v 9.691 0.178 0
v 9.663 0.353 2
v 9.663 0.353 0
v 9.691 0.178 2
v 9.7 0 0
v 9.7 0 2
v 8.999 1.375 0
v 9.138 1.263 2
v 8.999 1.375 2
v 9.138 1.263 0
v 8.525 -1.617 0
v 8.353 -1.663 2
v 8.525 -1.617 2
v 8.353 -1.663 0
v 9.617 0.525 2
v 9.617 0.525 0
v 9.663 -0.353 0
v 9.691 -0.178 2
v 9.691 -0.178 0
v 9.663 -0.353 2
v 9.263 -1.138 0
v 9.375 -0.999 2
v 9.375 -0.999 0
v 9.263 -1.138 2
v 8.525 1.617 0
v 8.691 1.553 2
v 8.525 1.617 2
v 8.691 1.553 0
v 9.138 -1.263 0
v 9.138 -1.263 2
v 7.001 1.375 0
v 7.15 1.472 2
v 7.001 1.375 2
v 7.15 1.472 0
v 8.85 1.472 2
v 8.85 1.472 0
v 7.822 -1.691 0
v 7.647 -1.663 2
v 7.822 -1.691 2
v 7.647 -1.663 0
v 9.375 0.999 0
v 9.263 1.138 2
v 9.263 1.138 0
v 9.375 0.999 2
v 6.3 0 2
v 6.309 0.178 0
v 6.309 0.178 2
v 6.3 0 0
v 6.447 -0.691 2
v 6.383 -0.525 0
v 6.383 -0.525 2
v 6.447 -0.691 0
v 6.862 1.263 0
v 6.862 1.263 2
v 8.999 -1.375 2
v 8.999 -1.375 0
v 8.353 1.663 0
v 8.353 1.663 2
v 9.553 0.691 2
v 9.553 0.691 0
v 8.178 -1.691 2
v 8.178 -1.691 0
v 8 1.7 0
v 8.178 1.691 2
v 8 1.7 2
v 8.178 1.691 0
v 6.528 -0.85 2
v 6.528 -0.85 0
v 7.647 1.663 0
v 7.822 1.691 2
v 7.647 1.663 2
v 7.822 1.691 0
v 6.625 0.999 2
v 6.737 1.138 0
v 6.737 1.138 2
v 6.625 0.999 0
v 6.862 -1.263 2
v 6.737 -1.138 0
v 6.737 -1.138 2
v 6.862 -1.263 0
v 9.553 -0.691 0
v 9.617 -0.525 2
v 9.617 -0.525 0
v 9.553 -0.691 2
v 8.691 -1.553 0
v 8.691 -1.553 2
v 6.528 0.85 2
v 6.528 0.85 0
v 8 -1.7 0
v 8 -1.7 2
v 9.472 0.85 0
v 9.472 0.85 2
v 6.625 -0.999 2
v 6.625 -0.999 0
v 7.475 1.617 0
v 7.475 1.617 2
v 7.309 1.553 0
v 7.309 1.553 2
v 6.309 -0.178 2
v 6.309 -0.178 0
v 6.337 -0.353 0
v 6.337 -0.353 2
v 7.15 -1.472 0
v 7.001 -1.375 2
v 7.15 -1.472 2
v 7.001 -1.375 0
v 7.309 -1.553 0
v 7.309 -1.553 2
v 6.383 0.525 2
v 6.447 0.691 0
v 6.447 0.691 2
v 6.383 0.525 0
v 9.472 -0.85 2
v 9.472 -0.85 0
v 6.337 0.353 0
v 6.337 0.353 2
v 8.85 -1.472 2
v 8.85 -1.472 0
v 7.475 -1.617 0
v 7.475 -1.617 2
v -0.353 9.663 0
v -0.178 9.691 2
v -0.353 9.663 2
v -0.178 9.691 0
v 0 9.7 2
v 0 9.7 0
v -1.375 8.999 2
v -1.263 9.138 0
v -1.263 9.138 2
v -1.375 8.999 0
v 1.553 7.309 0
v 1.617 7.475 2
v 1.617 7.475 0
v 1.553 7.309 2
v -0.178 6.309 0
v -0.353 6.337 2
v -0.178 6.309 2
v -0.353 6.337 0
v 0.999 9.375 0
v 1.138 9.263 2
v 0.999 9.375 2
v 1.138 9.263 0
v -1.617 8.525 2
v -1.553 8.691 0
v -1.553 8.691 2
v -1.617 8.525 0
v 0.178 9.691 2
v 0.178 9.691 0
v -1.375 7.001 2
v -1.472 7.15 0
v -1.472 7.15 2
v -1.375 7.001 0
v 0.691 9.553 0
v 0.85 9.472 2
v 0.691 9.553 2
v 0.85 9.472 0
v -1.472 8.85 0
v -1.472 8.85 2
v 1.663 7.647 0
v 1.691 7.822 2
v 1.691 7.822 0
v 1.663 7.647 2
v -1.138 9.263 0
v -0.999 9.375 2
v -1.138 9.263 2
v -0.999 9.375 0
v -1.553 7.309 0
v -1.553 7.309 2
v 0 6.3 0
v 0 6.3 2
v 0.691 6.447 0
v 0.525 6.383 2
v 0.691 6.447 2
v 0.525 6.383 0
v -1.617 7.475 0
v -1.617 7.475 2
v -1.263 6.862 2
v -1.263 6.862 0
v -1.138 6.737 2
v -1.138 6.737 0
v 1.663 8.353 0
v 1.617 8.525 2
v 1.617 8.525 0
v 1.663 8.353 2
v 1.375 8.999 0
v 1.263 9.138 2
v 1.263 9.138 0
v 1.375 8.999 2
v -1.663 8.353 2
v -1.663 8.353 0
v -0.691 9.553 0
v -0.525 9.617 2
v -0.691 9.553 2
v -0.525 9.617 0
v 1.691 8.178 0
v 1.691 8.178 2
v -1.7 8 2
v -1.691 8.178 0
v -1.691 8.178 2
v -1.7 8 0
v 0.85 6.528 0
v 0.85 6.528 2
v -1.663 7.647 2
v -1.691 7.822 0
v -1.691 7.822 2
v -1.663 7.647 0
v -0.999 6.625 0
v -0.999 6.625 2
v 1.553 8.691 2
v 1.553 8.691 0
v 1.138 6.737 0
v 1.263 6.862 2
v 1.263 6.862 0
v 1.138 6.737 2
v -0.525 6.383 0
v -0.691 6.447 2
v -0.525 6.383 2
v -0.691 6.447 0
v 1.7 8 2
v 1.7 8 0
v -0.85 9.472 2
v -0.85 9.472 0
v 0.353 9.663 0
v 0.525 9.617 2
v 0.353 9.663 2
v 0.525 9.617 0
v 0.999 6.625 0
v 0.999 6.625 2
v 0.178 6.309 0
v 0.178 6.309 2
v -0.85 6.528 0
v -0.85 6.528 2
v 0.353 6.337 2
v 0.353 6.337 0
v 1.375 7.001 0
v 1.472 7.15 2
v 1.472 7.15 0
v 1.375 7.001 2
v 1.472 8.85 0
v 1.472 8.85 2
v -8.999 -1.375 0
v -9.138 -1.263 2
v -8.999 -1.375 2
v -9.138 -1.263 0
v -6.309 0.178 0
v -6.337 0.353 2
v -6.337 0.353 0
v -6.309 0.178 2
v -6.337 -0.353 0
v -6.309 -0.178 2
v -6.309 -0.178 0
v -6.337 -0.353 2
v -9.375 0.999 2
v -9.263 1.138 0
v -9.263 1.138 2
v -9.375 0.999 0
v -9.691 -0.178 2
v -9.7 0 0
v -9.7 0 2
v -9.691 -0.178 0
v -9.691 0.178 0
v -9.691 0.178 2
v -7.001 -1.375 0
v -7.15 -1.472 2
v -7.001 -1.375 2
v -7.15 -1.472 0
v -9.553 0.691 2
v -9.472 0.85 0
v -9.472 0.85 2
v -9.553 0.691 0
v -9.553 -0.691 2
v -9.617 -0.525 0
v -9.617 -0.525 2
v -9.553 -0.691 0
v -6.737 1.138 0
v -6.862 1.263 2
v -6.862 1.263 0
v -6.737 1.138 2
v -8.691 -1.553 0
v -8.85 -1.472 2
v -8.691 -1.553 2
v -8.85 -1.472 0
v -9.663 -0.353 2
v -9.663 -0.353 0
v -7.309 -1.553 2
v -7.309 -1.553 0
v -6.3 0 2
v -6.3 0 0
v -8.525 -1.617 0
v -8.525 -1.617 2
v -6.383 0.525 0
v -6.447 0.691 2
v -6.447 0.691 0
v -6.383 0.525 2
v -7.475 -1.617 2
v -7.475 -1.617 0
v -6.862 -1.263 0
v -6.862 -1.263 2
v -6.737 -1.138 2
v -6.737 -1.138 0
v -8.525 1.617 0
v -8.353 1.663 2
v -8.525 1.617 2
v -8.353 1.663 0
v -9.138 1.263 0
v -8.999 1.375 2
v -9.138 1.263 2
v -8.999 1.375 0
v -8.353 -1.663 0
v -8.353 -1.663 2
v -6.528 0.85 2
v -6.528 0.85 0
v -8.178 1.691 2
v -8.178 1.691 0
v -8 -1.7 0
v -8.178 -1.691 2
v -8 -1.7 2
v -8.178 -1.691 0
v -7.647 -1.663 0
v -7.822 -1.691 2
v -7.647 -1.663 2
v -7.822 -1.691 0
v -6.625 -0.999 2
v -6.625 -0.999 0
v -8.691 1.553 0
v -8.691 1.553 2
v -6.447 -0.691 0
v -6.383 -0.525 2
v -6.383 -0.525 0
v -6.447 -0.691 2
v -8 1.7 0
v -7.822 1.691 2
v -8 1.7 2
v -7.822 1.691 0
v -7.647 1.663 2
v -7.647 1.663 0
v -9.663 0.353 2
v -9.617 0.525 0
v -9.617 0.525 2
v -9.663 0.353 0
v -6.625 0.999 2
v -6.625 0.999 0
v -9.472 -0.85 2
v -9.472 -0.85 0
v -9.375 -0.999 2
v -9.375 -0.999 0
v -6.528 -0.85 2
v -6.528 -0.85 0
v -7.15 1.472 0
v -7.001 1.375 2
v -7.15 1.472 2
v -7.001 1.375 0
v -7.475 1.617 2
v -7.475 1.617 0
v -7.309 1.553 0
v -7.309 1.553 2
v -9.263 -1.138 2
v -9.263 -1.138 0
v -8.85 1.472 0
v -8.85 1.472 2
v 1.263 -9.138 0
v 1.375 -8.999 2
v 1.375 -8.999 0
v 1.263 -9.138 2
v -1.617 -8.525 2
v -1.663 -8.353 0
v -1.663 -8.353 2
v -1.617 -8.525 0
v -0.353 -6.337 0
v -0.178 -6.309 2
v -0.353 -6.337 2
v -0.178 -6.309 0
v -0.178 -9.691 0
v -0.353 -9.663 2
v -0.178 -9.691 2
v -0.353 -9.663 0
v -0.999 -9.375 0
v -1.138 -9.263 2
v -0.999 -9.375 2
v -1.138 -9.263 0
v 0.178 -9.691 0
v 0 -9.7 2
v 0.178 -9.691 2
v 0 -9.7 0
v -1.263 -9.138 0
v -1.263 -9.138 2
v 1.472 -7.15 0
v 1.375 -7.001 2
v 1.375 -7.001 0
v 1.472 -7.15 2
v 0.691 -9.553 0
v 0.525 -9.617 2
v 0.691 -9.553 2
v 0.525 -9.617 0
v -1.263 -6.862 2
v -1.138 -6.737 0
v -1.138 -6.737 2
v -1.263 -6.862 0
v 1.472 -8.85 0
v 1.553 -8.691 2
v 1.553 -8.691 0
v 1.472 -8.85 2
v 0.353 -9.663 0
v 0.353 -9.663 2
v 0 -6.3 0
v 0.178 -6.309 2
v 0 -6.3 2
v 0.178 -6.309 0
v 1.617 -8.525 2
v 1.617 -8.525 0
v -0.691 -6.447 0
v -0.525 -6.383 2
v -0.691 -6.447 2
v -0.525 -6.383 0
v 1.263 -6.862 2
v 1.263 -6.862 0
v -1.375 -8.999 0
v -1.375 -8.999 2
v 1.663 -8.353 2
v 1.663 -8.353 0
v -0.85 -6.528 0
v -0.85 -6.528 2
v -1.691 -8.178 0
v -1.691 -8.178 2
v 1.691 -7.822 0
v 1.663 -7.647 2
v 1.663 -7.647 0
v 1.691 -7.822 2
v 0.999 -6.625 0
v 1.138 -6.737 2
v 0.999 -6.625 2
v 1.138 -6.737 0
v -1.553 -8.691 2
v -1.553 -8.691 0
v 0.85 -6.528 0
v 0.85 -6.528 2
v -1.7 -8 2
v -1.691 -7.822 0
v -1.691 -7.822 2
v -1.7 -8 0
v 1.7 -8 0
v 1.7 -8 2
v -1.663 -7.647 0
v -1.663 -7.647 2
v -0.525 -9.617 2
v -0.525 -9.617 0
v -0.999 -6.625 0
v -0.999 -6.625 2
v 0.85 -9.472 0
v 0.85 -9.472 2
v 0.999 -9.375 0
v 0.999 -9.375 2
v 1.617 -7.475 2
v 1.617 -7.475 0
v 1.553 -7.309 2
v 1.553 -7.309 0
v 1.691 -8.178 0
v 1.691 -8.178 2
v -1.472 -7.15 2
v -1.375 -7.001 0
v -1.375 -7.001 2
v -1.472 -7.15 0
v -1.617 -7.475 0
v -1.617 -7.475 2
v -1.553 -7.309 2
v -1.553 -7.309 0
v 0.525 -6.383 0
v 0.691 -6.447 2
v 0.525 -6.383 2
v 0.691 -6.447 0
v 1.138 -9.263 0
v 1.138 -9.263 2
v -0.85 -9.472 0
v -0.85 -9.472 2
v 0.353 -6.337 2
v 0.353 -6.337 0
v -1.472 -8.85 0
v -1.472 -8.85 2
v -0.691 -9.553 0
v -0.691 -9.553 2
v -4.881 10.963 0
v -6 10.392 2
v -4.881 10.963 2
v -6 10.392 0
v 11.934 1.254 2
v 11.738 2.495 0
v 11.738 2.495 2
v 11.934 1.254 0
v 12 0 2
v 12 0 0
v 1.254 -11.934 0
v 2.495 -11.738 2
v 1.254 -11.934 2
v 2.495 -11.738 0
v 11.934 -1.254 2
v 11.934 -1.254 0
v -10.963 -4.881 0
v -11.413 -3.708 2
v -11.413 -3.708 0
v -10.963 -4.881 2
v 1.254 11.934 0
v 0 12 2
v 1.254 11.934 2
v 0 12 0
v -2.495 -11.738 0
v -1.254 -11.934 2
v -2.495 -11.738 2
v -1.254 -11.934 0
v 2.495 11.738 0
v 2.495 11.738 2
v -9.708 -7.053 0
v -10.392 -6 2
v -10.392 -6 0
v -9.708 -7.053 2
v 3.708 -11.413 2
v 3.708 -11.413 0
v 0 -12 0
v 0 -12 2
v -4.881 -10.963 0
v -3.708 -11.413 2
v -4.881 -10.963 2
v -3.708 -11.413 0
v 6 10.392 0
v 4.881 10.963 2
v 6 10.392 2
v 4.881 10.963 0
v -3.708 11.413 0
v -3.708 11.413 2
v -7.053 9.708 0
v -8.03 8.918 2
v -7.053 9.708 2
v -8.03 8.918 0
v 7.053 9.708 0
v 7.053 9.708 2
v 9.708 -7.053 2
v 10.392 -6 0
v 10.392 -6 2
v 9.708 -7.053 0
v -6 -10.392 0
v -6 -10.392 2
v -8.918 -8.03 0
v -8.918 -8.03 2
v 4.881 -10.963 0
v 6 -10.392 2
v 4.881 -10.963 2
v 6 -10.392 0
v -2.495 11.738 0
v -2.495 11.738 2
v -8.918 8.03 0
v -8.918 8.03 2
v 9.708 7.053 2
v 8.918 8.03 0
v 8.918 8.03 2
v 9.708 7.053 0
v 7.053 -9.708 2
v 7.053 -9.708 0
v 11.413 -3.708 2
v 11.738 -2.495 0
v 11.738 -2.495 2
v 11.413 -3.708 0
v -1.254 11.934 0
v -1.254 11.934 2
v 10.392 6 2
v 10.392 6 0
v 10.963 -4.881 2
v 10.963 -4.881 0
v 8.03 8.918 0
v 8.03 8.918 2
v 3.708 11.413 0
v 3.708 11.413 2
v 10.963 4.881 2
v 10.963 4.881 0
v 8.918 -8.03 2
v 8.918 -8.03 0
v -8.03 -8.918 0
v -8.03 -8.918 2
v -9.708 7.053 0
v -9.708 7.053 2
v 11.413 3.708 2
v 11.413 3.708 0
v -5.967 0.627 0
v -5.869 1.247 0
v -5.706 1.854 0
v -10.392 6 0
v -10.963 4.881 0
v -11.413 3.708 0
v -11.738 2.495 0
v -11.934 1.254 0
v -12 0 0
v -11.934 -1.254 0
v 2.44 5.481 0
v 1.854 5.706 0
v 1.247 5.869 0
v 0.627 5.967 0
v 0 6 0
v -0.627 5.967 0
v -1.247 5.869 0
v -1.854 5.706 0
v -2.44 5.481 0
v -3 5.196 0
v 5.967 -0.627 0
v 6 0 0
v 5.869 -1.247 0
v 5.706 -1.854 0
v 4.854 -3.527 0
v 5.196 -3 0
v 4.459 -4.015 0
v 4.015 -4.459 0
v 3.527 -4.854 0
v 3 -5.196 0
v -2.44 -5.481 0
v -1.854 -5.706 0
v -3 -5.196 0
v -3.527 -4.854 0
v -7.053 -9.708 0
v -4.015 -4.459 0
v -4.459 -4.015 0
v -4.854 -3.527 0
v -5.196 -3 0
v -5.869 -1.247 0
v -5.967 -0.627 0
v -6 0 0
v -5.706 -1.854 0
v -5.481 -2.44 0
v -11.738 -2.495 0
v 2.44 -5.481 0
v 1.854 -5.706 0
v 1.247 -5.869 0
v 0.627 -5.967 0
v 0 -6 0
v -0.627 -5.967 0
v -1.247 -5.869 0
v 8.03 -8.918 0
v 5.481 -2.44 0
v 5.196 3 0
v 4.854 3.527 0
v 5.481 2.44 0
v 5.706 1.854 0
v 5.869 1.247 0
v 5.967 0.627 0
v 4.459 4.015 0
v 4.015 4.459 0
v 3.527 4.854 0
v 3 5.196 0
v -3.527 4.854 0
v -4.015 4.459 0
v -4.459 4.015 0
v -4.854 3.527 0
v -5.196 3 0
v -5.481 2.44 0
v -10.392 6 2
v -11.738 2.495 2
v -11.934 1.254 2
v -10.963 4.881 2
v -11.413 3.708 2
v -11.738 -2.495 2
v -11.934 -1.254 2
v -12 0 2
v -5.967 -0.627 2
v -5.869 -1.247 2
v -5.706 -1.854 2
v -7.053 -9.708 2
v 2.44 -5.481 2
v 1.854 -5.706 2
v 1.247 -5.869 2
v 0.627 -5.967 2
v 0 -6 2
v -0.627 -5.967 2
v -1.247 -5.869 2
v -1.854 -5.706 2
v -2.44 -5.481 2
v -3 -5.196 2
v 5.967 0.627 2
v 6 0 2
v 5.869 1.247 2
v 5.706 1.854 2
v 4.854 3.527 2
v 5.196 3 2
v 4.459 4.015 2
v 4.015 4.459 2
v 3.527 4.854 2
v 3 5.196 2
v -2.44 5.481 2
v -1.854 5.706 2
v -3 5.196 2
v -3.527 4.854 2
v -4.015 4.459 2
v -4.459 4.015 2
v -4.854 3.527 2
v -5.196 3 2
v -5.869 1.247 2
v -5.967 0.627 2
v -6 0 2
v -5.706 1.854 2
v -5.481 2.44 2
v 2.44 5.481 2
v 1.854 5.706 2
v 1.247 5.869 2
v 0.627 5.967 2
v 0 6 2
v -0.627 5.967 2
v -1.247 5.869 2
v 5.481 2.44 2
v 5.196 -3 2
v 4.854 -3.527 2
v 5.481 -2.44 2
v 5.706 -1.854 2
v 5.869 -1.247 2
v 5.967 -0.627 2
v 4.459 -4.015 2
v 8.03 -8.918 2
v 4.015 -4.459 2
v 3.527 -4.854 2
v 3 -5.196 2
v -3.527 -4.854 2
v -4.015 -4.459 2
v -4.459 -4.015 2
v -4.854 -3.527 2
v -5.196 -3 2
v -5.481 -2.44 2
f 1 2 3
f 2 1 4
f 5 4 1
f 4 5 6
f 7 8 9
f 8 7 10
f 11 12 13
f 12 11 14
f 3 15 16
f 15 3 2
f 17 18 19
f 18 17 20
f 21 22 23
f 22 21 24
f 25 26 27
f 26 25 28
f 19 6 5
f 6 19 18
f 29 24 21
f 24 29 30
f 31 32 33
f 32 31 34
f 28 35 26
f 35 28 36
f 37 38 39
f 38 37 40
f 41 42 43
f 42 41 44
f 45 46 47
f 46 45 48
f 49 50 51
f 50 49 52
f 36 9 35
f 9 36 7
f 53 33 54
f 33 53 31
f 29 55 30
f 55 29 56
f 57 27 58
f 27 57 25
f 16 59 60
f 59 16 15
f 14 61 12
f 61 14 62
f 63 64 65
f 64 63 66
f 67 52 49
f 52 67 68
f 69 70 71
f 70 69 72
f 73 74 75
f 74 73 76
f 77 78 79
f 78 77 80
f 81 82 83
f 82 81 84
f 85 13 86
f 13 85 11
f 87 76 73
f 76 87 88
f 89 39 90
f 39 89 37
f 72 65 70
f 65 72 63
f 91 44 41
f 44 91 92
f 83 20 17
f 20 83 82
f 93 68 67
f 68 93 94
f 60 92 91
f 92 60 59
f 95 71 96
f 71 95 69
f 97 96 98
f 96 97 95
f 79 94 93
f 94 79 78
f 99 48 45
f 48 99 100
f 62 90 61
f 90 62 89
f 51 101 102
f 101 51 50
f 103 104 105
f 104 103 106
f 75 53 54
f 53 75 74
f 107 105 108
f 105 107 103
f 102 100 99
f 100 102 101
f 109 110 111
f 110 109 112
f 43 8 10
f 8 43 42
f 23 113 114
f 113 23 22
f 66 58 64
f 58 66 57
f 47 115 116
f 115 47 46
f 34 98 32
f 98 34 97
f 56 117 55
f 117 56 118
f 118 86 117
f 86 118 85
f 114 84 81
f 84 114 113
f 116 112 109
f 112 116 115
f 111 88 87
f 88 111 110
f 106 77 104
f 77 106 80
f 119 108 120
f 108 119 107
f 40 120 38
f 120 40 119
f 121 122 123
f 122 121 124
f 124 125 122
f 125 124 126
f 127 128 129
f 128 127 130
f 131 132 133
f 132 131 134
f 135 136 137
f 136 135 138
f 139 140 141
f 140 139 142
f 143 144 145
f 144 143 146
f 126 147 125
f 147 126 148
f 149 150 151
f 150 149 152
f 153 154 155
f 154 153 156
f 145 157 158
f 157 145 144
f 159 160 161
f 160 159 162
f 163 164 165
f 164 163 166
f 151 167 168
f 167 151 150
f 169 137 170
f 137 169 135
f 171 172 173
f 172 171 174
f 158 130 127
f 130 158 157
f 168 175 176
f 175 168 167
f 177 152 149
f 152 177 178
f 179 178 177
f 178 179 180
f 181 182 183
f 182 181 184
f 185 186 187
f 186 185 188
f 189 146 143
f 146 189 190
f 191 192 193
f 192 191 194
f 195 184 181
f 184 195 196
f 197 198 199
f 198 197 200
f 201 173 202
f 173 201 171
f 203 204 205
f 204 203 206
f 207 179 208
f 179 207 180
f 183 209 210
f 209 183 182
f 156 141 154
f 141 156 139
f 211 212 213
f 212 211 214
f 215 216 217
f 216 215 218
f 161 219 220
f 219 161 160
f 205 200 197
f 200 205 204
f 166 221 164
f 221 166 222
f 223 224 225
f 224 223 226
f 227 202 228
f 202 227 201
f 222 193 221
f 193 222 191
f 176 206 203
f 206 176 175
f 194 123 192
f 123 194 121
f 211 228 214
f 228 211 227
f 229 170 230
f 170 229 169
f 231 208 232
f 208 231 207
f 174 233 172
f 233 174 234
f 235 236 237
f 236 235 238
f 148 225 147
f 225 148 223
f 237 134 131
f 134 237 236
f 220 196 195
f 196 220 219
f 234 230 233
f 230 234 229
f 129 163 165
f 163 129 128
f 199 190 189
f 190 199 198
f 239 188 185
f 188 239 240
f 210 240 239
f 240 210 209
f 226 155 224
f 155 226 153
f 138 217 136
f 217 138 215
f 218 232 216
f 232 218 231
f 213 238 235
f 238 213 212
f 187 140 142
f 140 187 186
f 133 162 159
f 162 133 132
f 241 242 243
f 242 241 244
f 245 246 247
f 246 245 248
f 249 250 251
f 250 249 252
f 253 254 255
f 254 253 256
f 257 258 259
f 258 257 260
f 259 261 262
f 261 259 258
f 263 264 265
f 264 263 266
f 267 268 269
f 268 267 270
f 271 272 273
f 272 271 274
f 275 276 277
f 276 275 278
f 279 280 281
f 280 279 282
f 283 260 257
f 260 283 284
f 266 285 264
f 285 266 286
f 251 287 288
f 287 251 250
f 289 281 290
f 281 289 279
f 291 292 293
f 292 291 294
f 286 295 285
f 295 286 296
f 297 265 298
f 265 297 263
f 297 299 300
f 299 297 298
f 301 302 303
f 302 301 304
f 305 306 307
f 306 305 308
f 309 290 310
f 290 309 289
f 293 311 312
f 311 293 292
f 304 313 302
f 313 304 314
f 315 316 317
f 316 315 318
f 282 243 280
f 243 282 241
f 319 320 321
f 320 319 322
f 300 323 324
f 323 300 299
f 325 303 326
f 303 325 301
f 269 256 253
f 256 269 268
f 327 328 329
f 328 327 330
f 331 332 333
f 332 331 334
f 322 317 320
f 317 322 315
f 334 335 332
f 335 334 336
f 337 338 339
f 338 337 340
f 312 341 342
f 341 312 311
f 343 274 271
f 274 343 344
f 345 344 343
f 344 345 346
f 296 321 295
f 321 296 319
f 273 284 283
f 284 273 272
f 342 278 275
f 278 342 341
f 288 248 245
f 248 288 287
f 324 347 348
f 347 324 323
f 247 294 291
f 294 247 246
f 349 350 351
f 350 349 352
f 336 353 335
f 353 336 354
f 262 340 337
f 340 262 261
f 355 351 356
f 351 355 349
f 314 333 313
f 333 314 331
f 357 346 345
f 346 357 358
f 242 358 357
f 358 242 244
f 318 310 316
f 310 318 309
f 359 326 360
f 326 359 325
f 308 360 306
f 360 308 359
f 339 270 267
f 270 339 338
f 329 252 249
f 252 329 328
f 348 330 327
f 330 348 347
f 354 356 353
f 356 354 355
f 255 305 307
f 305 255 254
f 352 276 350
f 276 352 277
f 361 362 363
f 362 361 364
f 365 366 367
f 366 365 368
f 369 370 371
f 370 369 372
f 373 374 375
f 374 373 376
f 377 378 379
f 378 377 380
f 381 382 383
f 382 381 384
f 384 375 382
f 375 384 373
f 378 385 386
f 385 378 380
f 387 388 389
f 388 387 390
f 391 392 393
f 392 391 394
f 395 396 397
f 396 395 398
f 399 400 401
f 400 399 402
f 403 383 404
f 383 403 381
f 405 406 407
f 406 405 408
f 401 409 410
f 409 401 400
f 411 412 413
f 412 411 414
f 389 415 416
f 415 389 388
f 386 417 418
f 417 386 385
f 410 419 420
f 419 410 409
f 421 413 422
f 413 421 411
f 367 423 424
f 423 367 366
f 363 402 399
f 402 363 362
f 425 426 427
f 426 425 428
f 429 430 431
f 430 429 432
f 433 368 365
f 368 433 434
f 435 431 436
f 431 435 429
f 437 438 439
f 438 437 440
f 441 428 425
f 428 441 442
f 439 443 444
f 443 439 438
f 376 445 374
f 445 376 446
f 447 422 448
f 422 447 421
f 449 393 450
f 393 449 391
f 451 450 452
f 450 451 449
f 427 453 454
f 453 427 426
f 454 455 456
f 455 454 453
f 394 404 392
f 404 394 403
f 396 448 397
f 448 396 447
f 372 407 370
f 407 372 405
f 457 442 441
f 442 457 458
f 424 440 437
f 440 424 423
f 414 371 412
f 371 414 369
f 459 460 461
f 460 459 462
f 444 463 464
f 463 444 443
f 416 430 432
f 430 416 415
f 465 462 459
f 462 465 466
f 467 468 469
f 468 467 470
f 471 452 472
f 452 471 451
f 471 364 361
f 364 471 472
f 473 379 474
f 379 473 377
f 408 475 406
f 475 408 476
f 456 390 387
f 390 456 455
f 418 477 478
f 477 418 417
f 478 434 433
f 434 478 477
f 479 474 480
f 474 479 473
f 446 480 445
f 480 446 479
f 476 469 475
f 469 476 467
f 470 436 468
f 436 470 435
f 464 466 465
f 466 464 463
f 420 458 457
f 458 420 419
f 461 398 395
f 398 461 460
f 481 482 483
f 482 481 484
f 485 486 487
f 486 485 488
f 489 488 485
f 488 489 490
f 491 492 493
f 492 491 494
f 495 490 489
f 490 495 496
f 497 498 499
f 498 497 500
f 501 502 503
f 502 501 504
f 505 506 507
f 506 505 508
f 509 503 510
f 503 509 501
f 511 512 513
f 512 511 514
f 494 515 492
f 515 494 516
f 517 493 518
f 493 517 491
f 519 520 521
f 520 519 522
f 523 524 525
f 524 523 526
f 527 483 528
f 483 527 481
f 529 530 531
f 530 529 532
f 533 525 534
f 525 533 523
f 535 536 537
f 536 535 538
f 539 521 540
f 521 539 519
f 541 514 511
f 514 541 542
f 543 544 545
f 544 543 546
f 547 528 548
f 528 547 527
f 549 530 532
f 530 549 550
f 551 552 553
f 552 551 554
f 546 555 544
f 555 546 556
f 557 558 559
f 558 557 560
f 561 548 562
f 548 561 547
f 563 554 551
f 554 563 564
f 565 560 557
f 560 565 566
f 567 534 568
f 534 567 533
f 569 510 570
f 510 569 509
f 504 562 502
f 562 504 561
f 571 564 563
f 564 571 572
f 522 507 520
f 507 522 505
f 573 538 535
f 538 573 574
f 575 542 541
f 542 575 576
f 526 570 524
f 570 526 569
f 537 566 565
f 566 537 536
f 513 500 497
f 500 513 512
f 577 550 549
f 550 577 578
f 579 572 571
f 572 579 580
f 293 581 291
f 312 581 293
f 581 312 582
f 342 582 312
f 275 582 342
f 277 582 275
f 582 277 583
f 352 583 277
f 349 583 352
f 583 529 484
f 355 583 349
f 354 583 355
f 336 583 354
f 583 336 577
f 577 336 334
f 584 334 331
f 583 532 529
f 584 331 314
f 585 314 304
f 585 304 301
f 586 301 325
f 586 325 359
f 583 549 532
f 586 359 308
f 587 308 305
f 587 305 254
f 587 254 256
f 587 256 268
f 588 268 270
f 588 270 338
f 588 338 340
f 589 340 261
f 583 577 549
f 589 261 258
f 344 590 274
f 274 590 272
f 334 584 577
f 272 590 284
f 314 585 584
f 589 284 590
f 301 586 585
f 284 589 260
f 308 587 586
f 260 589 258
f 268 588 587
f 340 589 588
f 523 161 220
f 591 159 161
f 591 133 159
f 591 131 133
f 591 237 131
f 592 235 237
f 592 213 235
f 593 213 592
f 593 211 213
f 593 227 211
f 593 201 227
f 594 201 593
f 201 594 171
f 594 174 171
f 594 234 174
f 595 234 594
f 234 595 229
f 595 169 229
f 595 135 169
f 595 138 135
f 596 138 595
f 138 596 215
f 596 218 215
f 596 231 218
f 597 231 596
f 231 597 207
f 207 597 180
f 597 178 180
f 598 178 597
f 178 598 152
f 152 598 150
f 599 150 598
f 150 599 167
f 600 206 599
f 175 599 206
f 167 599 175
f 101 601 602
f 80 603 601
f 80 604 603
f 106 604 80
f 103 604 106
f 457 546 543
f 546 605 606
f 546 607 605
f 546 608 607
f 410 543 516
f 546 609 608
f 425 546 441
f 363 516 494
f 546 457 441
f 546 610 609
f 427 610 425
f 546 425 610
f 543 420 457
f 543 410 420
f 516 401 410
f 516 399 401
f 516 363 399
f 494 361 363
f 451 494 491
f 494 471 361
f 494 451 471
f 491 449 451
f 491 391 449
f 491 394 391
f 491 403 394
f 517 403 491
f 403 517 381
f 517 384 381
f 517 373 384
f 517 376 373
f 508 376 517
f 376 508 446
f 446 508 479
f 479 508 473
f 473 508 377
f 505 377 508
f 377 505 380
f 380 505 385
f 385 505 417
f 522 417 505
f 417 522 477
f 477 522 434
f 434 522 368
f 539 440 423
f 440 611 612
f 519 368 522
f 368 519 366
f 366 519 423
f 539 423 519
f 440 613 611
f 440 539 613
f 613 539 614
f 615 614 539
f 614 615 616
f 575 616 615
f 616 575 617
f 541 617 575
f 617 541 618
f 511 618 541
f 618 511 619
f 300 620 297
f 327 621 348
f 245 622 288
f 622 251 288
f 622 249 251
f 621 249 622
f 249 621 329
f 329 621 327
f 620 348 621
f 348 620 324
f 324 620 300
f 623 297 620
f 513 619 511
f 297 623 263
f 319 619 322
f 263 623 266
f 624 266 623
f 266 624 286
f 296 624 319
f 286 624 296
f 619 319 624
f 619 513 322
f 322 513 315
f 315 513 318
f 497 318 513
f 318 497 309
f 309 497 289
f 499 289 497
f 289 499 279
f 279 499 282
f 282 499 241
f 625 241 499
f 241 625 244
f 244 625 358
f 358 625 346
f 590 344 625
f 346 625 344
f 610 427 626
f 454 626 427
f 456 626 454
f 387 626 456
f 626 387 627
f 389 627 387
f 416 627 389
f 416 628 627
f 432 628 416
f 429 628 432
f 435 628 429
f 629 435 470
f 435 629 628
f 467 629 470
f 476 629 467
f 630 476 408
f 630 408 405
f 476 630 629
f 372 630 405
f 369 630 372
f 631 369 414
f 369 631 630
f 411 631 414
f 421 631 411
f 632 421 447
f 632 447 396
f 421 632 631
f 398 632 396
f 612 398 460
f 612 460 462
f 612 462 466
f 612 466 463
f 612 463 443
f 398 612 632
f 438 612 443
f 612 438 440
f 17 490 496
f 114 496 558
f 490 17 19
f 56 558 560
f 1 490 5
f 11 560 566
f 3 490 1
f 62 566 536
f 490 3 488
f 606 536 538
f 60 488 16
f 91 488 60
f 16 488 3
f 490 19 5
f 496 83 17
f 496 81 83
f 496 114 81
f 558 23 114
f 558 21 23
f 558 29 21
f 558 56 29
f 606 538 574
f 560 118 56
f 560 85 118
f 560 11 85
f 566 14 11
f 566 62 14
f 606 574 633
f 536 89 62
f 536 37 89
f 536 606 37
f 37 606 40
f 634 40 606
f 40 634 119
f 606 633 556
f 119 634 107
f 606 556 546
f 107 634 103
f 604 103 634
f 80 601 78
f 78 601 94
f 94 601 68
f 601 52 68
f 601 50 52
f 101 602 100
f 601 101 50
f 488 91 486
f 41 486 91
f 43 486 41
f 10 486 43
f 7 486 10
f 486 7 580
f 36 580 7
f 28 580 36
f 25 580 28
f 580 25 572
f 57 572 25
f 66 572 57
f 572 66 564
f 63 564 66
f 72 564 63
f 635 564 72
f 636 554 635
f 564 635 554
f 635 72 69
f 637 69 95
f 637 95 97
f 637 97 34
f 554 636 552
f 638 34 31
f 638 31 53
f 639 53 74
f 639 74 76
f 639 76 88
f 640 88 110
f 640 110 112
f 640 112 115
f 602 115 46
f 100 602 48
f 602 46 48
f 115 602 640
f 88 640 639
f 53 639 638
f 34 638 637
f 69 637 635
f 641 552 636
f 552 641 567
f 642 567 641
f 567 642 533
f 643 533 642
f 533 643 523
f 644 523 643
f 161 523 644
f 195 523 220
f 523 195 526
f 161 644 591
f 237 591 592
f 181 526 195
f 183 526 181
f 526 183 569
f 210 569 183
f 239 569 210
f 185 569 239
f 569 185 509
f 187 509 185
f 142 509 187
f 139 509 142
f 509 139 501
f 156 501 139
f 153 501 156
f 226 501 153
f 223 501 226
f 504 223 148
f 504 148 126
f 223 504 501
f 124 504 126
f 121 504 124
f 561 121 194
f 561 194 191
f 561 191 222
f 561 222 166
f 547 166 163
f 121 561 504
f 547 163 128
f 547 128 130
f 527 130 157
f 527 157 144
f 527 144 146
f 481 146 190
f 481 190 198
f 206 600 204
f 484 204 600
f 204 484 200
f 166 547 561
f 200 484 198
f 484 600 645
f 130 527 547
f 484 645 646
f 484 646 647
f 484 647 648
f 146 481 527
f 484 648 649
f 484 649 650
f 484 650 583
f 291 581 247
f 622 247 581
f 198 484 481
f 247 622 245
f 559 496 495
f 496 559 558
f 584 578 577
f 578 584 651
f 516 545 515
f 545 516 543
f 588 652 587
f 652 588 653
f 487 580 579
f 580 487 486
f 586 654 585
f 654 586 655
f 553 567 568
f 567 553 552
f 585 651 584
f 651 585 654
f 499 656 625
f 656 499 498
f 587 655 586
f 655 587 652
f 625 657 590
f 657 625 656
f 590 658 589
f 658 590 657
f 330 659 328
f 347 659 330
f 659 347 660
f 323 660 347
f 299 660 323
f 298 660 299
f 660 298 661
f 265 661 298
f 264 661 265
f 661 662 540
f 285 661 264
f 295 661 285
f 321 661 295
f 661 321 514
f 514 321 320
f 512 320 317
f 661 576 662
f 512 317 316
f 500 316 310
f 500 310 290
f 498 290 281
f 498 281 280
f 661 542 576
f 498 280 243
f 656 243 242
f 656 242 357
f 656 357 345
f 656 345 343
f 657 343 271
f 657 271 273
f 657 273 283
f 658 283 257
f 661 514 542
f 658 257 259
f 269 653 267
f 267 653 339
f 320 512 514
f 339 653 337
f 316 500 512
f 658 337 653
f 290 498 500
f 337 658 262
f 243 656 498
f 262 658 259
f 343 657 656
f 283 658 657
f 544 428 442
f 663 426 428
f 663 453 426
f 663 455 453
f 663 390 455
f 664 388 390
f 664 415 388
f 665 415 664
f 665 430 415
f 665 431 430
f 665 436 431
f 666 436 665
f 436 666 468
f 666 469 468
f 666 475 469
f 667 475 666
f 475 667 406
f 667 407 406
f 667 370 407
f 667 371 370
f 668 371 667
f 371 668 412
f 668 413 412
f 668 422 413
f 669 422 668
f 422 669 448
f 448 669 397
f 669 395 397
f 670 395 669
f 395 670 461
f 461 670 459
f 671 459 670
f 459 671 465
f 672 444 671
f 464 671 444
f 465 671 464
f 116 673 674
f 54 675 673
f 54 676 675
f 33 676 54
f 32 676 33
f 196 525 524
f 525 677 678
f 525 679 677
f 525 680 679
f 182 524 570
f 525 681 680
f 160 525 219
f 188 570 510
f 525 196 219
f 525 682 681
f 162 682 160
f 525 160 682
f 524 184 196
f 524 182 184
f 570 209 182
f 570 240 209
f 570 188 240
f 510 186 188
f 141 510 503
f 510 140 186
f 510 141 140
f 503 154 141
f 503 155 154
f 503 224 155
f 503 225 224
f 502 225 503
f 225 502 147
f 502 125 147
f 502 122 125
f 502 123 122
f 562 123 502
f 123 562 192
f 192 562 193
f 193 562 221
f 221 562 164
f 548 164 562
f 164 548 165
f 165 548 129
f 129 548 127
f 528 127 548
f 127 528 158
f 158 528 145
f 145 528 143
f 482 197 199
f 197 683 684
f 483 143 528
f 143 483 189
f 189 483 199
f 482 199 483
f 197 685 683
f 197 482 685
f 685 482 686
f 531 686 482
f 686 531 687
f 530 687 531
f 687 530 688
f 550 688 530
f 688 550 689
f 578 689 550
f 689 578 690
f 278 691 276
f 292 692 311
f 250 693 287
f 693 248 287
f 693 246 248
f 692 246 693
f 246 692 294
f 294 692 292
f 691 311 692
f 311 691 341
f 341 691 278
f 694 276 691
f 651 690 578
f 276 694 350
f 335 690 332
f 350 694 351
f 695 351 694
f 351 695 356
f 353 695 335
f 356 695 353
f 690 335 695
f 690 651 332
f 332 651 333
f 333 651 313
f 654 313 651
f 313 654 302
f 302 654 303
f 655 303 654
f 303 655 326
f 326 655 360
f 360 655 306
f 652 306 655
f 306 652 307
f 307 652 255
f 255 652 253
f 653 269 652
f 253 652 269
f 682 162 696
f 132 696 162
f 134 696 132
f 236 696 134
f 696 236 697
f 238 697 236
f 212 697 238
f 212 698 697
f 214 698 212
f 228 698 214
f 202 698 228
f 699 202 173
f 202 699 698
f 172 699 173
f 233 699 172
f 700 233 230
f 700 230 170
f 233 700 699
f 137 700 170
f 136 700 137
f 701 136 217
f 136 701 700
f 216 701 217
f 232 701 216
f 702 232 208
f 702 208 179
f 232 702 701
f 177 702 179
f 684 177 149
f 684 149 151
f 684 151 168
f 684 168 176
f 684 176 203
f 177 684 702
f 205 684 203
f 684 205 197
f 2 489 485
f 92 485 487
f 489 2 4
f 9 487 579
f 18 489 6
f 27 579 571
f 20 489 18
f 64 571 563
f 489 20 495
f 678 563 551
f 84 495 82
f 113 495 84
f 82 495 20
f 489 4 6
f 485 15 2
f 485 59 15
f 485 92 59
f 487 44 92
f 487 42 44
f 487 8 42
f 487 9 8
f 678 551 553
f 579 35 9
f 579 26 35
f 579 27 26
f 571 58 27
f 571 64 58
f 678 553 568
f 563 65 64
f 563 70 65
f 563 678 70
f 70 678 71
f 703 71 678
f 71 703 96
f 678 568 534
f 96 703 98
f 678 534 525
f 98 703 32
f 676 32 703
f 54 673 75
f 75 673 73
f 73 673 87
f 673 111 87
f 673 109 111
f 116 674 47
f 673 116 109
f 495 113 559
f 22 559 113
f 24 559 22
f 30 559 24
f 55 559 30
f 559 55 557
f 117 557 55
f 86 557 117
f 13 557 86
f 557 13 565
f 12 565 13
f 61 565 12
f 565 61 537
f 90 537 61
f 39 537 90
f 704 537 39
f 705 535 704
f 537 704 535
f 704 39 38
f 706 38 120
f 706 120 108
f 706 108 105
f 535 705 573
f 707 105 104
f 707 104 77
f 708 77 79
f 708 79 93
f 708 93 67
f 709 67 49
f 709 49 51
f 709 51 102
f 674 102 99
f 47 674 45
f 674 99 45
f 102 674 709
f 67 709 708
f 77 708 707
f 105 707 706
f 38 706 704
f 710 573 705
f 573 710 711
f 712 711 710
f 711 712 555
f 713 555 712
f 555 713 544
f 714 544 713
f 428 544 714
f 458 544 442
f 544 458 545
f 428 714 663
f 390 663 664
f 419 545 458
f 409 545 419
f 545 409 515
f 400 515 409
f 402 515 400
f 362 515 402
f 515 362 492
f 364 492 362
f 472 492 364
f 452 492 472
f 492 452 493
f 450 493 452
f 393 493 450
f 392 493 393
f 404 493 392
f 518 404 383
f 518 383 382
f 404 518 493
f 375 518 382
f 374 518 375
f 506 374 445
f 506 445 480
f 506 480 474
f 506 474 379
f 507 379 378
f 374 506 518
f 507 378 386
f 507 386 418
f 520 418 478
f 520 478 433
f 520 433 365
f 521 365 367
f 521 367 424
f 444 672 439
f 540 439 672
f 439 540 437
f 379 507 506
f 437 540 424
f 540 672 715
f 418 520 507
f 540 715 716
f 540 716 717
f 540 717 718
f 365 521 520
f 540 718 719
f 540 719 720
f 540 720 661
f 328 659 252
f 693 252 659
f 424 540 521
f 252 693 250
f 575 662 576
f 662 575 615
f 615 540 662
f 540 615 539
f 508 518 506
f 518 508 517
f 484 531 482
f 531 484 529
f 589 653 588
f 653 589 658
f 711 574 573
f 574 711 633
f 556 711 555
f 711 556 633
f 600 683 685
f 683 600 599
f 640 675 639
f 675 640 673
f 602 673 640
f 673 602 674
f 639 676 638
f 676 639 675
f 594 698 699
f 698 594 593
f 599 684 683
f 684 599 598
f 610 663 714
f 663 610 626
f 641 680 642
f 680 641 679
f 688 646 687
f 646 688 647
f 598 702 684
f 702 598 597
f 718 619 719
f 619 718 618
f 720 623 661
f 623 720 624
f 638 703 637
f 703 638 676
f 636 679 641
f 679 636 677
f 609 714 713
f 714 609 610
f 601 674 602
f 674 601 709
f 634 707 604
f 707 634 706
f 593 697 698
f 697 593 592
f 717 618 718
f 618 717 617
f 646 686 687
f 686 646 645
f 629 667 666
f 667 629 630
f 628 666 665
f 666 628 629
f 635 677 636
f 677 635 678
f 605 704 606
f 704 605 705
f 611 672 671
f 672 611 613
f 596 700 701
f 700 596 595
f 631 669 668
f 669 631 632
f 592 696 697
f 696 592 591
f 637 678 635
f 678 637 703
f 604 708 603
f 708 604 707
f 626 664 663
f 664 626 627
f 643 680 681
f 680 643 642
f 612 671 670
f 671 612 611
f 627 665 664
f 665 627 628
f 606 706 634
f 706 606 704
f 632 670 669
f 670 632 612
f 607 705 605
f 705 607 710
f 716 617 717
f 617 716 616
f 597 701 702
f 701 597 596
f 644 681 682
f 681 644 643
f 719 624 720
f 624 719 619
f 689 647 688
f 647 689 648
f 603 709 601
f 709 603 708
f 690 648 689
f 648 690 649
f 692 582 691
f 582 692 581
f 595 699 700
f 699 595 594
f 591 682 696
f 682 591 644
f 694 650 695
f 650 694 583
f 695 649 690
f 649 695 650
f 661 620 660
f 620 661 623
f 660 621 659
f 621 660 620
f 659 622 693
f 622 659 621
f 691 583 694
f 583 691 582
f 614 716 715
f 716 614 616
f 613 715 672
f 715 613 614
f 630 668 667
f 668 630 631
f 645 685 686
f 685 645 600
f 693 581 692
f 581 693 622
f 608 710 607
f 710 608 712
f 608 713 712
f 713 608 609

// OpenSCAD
// Bearing retaining ring.
$fn = 60;
eps = 0.02;
bearing_d = 12;
outer_d = 24;
thickness = 2;
difference() {
    cylinder(d=outer_d,h=thickness);
    translate([0,0,-eps]) cylinder(d=bearing_d,h=thickness+2*eps);
    for (i=[0:3]) rotate([0,0,i*90]) translate([outer_d/2-4,0,-eps]) cylinder(d=3.4,h=thickness+2*eps);
}
